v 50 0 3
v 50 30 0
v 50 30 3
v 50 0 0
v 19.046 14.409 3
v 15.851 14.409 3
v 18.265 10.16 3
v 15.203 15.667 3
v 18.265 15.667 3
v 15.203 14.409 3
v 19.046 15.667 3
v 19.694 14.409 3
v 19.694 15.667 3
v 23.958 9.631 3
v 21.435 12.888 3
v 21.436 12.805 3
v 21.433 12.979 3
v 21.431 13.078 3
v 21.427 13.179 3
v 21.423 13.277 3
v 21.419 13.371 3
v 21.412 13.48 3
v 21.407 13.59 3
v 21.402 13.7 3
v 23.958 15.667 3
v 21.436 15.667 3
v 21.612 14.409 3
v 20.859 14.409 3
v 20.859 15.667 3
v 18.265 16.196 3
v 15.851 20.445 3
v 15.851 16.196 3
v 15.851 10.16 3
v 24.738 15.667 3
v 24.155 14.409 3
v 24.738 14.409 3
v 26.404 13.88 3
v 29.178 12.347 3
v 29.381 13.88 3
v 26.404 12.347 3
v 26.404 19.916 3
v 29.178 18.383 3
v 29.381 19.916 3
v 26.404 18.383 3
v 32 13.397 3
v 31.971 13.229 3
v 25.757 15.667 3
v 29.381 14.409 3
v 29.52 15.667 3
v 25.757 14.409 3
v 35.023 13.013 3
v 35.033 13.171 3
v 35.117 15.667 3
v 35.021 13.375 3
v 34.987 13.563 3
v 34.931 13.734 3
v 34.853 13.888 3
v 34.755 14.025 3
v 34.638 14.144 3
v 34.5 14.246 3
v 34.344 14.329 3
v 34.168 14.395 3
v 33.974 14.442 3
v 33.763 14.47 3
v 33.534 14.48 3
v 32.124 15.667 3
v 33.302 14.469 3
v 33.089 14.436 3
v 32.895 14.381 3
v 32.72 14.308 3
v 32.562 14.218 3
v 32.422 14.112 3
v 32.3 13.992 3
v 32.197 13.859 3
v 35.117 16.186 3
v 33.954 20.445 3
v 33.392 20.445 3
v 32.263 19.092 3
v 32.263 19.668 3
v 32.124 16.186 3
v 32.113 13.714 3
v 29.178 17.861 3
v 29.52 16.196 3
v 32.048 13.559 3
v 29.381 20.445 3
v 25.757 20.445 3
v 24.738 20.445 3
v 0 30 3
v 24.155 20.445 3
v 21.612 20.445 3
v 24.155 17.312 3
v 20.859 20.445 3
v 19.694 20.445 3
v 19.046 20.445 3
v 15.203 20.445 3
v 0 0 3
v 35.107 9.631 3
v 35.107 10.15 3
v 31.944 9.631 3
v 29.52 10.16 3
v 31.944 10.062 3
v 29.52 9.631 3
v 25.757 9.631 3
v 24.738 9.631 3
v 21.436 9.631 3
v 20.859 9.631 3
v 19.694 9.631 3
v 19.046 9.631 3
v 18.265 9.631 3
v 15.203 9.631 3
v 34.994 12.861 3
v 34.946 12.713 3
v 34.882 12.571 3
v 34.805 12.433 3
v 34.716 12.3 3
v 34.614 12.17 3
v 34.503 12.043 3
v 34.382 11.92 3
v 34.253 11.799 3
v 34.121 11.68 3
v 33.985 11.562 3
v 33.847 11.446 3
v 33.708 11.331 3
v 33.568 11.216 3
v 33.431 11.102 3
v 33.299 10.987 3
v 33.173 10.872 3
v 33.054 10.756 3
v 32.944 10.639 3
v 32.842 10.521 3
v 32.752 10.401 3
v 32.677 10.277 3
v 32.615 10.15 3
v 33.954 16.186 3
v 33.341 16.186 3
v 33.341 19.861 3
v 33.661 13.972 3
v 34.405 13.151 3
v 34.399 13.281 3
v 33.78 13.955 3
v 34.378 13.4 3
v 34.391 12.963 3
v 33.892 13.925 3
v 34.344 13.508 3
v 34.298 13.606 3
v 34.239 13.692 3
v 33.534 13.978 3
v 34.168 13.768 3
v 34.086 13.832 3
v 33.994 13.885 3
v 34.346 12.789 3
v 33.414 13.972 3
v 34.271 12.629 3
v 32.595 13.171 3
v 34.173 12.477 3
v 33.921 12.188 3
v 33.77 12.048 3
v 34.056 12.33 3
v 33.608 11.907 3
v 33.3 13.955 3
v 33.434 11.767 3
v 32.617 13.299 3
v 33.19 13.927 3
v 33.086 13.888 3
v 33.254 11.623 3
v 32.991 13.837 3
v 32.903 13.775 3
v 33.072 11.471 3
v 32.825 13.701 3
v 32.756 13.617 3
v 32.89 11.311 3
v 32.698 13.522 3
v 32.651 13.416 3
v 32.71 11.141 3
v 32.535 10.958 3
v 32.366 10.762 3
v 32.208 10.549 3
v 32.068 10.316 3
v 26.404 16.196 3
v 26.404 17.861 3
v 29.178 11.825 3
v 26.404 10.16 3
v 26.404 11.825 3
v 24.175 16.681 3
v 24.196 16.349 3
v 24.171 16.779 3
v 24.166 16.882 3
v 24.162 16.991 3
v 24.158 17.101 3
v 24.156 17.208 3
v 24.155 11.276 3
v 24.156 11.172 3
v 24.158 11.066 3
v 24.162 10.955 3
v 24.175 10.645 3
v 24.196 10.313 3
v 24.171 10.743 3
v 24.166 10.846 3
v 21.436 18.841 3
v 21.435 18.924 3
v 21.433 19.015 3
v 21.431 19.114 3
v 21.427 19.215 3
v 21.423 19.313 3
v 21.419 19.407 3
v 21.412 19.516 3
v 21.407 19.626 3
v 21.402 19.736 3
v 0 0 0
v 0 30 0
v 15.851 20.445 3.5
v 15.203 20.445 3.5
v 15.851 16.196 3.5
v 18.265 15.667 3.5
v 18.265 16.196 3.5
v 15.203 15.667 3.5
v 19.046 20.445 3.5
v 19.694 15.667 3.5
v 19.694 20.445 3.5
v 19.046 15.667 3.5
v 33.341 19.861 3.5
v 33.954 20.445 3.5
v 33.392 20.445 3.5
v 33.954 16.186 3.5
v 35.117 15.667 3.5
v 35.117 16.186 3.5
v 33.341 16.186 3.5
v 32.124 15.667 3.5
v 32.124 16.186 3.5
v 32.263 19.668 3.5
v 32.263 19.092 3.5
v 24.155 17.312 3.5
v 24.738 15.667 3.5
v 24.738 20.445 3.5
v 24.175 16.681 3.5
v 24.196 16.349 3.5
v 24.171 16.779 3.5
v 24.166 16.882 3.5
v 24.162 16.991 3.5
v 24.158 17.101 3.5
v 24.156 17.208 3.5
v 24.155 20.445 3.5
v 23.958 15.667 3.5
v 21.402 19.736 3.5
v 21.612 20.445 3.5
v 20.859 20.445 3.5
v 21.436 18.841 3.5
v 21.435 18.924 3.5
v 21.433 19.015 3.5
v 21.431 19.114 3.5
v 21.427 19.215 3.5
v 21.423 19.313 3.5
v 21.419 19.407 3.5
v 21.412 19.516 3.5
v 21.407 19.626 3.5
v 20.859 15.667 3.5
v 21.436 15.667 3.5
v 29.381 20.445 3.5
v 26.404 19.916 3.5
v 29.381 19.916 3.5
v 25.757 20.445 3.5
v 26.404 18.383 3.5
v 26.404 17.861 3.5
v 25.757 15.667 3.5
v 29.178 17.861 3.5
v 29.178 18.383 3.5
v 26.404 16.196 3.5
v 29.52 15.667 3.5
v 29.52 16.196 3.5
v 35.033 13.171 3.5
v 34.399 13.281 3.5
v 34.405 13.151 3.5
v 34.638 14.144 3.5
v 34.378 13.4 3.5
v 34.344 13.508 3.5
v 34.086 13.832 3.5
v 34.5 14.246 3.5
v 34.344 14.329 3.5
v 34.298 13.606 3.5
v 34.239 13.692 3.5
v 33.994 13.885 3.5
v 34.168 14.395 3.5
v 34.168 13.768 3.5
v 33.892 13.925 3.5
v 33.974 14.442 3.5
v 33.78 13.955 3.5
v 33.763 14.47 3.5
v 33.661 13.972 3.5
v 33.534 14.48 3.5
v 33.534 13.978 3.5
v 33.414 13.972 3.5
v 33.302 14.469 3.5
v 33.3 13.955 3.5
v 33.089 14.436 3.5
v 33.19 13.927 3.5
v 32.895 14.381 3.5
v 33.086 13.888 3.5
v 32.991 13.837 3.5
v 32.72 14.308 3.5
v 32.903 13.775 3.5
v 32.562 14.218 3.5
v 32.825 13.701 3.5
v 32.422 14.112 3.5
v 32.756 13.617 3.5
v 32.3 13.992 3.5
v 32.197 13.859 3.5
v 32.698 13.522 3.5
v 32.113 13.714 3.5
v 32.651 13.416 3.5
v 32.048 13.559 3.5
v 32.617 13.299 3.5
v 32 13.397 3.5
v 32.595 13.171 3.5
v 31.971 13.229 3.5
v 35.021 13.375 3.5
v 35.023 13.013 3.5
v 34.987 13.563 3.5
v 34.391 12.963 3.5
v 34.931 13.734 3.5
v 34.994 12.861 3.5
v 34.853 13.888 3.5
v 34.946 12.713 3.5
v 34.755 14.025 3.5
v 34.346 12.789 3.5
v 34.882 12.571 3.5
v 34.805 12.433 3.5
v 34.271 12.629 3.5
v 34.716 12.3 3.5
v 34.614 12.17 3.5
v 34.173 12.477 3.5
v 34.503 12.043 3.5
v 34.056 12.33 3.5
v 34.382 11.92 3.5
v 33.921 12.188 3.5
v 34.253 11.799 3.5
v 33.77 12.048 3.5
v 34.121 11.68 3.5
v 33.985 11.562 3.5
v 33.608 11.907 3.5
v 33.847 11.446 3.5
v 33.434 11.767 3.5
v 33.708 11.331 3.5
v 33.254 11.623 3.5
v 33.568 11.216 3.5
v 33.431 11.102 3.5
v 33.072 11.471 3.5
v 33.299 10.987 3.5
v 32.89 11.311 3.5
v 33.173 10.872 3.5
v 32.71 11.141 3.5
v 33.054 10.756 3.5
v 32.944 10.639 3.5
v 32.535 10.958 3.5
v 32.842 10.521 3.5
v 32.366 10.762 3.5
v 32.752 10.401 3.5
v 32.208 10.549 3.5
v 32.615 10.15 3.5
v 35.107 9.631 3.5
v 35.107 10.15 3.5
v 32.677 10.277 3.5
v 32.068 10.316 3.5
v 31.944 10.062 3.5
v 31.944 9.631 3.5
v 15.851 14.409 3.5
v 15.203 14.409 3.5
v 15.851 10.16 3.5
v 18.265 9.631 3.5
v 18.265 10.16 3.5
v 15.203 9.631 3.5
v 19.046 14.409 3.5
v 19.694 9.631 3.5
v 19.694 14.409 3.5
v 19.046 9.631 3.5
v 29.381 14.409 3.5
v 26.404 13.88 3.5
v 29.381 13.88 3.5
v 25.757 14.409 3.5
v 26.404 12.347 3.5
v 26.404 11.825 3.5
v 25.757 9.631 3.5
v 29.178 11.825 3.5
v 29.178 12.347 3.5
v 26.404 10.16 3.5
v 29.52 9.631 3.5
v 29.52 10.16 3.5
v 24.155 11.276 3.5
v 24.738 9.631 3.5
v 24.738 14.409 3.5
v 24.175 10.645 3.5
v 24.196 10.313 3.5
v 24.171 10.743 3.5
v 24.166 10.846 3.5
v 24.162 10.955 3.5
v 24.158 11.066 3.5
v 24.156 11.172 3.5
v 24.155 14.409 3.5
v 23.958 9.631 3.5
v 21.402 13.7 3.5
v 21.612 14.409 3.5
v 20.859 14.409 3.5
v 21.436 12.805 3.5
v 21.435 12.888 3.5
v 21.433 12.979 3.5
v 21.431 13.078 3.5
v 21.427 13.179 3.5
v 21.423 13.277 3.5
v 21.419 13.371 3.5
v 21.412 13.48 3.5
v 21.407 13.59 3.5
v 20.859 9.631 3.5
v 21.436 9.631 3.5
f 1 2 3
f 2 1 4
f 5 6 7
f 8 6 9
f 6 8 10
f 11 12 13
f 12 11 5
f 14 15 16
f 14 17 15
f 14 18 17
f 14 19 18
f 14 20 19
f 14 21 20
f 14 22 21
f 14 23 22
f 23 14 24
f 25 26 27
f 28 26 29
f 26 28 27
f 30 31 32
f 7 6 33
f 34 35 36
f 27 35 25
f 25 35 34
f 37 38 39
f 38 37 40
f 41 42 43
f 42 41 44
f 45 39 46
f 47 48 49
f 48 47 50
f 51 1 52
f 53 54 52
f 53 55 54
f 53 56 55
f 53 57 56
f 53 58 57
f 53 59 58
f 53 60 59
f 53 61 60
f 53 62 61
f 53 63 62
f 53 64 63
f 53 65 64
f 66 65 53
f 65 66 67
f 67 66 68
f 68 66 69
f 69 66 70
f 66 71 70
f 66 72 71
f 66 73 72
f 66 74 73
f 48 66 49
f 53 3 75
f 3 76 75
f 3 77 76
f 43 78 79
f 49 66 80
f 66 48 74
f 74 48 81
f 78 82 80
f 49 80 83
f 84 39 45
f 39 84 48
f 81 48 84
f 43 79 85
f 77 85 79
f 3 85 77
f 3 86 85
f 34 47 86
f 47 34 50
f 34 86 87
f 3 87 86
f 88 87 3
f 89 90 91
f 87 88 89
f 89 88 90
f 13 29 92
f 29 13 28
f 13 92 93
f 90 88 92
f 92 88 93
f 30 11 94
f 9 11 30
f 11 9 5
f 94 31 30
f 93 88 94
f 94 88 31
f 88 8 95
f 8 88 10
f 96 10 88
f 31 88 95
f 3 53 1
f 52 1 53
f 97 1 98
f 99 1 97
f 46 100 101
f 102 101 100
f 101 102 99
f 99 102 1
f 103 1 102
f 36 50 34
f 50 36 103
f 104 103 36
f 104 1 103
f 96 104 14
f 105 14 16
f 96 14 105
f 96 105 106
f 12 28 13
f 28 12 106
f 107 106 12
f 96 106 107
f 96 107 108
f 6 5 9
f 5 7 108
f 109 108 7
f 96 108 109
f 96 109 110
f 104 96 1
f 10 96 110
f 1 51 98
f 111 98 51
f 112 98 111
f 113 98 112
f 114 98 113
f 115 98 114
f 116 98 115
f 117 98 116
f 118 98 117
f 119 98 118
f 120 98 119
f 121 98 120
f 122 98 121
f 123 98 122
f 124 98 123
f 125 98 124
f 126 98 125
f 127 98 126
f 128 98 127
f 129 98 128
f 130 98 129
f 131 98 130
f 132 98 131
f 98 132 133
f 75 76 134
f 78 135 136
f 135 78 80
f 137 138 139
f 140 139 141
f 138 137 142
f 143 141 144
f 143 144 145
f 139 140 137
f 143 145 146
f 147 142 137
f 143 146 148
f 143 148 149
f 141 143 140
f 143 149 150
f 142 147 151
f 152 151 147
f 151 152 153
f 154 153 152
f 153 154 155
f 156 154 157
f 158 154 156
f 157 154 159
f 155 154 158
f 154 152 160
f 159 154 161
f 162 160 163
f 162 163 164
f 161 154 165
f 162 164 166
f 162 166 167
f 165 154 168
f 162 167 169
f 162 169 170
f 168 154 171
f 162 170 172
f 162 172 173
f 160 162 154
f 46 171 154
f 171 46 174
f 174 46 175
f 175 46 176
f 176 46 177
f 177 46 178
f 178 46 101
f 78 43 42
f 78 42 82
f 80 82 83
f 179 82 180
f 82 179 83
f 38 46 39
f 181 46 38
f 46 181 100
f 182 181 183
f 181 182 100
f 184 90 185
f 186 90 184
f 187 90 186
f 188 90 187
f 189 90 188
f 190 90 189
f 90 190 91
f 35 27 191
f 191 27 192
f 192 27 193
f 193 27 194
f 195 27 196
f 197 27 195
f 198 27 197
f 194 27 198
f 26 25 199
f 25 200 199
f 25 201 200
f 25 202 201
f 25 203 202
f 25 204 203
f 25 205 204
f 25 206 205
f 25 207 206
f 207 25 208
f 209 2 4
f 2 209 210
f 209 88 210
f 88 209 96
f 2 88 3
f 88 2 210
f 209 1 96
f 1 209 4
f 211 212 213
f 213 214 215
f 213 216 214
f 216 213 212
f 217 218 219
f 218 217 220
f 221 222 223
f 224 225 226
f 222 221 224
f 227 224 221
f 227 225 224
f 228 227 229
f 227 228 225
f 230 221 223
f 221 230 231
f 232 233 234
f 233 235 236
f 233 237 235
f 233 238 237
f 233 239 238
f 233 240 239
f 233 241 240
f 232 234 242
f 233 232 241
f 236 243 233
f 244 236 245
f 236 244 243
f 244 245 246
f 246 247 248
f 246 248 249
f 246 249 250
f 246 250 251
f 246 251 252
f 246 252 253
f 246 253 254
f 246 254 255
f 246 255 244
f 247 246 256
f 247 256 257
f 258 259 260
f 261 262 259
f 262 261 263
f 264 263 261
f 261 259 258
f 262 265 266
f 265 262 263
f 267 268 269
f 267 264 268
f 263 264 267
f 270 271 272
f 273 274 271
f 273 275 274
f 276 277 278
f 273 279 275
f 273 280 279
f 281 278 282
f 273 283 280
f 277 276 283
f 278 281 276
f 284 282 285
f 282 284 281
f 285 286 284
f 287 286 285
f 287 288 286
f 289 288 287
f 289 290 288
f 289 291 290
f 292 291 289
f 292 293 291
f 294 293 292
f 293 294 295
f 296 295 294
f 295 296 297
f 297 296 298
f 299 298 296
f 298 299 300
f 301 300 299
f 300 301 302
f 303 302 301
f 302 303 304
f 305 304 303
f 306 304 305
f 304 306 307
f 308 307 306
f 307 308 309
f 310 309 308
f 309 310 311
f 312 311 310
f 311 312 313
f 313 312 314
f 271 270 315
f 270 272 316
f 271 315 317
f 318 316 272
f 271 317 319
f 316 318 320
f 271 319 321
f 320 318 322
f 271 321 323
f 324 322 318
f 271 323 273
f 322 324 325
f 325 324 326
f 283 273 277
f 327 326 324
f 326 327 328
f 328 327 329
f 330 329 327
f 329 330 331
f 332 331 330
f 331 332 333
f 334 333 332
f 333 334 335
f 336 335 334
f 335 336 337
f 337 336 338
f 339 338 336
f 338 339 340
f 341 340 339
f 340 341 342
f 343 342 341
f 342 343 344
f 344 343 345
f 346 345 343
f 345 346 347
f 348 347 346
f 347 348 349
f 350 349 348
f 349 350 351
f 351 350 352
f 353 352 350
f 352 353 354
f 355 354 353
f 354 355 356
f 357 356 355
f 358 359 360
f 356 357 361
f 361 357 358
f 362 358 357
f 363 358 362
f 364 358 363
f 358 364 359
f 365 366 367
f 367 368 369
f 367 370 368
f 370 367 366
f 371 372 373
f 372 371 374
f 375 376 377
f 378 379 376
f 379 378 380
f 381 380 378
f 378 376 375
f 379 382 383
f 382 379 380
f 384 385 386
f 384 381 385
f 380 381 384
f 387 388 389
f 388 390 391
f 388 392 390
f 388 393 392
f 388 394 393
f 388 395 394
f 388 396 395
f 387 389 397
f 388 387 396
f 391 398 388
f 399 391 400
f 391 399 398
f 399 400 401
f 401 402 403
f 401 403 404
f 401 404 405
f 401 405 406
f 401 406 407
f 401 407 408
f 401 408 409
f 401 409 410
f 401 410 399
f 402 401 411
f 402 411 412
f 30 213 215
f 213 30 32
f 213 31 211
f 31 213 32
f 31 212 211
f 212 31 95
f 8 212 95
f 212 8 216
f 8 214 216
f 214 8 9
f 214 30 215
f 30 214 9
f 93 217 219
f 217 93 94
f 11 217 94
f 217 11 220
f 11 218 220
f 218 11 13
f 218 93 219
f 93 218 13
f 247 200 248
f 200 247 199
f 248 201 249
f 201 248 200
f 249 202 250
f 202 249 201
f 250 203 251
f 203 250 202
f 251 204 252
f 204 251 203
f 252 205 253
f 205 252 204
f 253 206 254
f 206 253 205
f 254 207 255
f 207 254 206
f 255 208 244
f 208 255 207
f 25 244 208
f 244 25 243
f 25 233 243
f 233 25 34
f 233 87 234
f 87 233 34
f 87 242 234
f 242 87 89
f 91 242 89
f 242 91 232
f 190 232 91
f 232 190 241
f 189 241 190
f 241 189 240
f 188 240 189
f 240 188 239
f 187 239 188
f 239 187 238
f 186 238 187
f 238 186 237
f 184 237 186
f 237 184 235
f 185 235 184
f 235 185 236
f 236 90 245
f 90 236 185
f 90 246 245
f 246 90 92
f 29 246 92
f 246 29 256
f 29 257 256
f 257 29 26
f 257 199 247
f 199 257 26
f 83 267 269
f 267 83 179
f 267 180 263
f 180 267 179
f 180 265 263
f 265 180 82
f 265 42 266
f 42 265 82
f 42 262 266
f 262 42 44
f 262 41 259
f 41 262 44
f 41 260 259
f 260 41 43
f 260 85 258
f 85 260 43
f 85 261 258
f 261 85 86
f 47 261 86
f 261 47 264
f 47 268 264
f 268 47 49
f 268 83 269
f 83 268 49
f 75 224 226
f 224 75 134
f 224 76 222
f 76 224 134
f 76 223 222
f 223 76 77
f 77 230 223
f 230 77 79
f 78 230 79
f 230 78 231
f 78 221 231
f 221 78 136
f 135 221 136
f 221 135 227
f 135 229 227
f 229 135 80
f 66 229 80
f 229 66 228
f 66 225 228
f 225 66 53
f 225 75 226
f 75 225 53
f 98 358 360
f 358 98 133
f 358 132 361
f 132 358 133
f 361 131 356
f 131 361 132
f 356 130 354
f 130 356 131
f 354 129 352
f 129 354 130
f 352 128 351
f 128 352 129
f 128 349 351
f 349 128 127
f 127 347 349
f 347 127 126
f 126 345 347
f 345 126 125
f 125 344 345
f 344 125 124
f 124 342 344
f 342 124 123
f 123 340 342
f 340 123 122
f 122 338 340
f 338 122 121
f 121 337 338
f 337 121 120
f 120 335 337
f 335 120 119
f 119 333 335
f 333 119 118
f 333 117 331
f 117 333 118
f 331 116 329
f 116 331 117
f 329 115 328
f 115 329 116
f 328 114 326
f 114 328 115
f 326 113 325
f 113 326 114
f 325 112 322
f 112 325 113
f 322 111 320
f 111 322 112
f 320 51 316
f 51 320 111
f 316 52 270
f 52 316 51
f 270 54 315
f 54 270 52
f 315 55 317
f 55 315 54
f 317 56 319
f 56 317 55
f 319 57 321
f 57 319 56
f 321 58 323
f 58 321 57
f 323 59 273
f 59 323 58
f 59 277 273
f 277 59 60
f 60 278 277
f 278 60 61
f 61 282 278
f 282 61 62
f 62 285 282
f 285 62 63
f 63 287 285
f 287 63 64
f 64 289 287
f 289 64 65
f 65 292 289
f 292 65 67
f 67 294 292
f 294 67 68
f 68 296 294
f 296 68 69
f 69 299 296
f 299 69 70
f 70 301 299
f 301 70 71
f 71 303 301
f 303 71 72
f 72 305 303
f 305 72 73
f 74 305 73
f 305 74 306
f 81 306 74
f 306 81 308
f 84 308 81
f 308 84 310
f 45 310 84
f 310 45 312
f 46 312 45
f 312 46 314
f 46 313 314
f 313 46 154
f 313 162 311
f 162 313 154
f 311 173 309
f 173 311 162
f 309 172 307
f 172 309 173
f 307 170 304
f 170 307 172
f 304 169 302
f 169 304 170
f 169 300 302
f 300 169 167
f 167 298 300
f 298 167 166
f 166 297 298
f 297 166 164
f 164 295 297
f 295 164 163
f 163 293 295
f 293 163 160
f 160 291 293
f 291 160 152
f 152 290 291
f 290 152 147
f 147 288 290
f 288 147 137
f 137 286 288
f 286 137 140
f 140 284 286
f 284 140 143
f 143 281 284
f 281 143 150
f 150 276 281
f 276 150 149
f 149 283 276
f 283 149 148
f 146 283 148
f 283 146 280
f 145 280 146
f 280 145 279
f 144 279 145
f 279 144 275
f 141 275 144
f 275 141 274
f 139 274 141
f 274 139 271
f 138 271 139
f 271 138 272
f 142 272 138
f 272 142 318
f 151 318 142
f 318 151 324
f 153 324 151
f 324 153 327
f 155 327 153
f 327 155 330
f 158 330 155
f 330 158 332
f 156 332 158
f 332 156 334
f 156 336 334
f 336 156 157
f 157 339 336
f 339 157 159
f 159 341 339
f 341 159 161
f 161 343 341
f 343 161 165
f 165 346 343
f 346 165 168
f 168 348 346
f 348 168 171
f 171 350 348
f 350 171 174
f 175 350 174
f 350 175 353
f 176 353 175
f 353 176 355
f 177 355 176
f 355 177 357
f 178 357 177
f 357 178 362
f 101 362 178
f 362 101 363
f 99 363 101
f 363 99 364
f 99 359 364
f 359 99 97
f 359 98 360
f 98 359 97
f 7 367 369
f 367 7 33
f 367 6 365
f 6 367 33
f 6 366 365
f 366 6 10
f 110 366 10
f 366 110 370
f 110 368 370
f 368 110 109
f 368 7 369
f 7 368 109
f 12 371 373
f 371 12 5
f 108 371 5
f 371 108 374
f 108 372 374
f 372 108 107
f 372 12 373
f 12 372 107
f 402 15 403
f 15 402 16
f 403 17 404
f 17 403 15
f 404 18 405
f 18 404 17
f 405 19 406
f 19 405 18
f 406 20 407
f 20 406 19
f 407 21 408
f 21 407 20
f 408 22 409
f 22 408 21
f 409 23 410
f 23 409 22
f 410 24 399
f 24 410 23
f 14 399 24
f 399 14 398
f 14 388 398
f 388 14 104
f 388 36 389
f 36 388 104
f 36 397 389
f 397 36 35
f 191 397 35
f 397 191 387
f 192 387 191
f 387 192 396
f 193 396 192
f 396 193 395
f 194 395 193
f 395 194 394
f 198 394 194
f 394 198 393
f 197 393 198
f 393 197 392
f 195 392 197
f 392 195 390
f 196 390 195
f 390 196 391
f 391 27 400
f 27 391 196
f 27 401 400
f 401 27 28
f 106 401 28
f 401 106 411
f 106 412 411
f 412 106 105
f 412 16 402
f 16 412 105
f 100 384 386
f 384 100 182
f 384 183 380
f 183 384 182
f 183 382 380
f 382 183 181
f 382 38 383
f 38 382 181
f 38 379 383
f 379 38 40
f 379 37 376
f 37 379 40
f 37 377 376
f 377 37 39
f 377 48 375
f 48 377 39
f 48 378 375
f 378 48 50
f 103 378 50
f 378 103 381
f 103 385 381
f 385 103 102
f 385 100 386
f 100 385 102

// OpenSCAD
// Generated by scadwright. Do not hand-edit —
// edit the Python source and regenerate.

union() {
    cube([50, 30, 3], center=false);

    translate([25, 15, 2.5]) {
        linear_extrude(height=1, center=false) {
            union() {
                translate([0, 3, 0]) {
                    text("LINE 1", size=5, halign="center", valign="center");
                }
                translate([0, -3, 0]) {
                    text("LINE 2", size=5, halign="center", valign="center");
                }
            }
        }
    }
}
